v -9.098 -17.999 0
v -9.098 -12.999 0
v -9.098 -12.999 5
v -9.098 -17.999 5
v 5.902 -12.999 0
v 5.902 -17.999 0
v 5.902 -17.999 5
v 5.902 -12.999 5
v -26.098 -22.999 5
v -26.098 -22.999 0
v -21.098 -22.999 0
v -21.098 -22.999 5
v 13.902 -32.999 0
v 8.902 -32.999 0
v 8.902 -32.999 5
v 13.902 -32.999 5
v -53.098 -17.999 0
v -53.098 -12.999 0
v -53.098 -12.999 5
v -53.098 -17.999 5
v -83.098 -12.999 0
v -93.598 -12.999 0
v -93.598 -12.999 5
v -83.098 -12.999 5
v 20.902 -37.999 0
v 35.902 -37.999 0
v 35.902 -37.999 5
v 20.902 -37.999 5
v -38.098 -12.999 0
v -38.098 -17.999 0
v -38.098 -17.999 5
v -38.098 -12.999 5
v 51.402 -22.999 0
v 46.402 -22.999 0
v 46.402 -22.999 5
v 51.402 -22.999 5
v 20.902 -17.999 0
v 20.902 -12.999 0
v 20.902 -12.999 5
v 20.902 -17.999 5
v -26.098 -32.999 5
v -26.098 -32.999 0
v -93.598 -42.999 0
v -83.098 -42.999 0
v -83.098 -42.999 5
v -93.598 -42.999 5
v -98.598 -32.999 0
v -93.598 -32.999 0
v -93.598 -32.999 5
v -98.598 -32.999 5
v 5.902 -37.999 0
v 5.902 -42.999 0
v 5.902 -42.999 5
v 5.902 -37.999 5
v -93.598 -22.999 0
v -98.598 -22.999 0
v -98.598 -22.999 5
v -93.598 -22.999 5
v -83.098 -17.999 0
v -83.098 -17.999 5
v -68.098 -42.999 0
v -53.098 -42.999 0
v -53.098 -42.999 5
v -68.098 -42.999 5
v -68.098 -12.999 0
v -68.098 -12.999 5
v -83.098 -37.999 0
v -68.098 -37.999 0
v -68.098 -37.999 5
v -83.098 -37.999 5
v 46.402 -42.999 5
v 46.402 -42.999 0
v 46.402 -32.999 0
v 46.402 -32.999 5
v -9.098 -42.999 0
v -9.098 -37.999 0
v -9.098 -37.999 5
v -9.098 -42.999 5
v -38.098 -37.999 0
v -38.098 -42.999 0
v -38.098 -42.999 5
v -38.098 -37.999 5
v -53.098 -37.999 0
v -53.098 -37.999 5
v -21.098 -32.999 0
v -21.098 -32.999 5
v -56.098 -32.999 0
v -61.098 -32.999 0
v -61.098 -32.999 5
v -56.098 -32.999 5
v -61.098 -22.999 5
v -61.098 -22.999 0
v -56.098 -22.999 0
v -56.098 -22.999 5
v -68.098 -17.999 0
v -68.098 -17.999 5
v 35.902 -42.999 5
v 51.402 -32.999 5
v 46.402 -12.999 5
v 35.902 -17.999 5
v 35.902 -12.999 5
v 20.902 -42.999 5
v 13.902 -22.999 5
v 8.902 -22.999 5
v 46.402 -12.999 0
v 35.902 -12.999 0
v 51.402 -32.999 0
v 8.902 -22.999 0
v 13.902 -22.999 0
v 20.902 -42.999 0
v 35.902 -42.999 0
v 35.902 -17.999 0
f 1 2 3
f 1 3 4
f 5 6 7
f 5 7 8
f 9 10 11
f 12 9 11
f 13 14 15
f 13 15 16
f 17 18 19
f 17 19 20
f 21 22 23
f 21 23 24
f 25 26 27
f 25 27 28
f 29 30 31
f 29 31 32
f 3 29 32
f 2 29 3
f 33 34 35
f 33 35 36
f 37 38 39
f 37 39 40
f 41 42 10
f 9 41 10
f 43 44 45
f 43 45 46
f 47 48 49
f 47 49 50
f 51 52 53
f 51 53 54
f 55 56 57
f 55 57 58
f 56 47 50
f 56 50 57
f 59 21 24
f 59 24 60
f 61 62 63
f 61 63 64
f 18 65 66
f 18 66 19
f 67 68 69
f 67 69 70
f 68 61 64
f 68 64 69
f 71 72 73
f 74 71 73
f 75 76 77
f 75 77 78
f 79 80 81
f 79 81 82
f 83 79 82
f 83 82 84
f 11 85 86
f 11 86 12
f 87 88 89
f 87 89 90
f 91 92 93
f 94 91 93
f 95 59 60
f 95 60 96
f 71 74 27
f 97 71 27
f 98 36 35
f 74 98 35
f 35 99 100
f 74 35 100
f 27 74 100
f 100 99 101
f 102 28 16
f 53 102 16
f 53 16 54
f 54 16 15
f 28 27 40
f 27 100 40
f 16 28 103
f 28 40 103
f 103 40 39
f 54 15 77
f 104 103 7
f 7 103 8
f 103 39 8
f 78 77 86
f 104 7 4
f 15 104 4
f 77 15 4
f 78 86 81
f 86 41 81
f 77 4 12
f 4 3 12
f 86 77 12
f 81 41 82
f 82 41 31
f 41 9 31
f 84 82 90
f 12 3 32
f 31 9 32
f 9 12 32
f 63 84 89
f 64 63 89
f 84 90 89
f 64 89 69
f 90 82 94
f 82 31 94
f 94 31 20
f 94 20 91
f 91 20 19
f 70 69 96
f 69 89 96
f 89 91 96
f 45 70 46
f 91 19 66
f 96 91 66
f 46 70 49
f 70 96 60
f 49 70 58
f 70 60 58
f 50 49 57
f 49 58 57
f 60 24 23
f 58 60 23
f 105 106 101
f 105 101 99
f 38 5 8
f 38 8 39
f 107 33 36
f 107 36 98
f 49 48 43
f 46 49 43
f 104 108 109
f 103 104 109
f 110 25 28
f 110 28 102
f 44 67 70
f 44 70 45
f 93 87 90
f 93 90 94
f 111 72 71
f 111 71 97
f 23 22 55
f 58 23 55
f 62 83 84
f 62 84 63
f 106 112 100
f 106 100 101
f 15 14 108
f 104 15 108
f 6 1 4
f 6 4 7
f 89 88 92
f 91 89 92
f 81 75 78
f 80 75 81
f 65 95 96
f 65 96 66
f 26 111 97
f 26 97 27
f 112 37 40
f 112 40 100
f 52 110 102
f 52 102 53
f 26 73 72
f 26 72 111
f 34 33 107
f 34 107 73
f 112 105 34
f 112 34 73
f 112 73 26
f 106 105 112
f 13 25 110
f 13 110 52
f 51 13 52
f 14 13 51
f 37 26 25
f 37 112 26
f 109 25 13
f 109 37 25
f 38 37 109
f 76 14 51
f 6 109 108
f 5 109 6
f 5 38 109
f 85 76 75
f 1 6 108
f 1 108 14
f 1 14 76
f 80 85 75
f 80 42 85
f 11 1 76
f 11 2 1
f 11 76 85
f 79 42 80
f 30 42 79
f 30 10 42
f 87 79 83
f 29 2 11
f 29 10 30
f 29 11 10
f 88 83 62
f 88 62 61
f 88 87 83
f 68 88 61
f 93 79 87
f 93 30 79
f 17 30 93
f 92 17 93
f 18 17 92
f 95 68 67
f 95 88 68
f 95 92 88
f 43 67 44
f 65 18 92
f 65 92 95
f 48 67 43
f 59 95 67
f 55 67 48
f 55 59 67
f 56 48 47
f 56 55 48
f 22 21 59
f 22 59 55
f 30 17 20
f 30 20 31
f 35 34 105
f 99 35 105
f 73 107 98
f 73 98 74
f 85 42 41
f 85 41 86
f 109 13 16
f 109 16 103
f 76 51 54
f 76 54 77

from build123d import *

# Parameters (mm, degrees)
SKETCH1_W           = 5
SKETCH1_H           = 10
BOSS_EXTRUDE1_DEPTH = 5


with BuildPart() as part:
    # Sketch1 → Boss-Extrude1 (new body)
    with BuildSketch(Plane.XY):
        Polygon((46.402376673, -17.999000463), (46.402376673, -22.999000463), (51.402376673, -22.999000463), (51.402376673, -32.999000463), (46.402376673, -32.999000463), (46.402376673, -37.999000463), (46.402376673, -42.999000463), (35.902376673, -42.999000463), (35.902376673, -37.999000463), (20.902376673, -37.999000463), (20.902376673, -42.999000463), (5.902376673, -42.999000463), (5.902376673, -37.999000463), (-9.097623327, -37.999000463), (-9.097623327, -42.999000463), (-38.097623327, -42.999000463), (-38.097623327, -37.999000463), (-53.097623327, -37.999000463), (-53.097623327, -42.999000463), (-68.097623327, -42.999000463), (-68.097623327, -37.999000463), (-83.097623327, -37.999000463), (-83.097623327, -42.999000463), (-93.597623327, -42.999000463), (-93.597623327, -37.999000463), (-93.597623327, -32.999000463), (-98.597623326, -32.999000463), (-98.597623326, -22.999000463), (-93.597623327, -22.999000463), (-93.597623327, -17.999000463), (-93.597623327, -12.999000463), (-83.097623327, -12.999000463), (-83.097623327, -17.999000463), (-68.097623327, -17.999000463), (-68.097623327, -12.999000463), (-53.097623327, -12.999000463), (-53.097623327, -17.999000463), (-38.097623327, -17.999000463), (-38.097623327, -12.999000463), (-9.097623327, -12.999000463), (-9.097623327, -17.999000463), (5.902376673, -17.999000463), (5.902376673, -12.999000463), (20.902376673, -12.999000463), (20.902376673, -17.999000463), (35.902376673, -17.999000463), (35.902376673, -12.999000463), (46.402376673, -12.999000463), align=None)
        with Locations((11.402376673, -27.999000463)):
            Rectangle(SKETCH1_W, SKETCH1_H, mode=Mode.SUBTRACT)
        with Locations((-23.597623327, -27.999000463)):
            Rectangle(SKETCH1_W, SKETCH1_H, mode=Mode.SUBTRACT)
        with Locations((-58.597623327, -27.999000463)):
            Rectangle(SKETCH1_W, SKETCH1_H, mode=Mode.SUBTRACT)
    extrude(amount=BOSS_EXTRUDE1_DEPTH)


solid = part.part
